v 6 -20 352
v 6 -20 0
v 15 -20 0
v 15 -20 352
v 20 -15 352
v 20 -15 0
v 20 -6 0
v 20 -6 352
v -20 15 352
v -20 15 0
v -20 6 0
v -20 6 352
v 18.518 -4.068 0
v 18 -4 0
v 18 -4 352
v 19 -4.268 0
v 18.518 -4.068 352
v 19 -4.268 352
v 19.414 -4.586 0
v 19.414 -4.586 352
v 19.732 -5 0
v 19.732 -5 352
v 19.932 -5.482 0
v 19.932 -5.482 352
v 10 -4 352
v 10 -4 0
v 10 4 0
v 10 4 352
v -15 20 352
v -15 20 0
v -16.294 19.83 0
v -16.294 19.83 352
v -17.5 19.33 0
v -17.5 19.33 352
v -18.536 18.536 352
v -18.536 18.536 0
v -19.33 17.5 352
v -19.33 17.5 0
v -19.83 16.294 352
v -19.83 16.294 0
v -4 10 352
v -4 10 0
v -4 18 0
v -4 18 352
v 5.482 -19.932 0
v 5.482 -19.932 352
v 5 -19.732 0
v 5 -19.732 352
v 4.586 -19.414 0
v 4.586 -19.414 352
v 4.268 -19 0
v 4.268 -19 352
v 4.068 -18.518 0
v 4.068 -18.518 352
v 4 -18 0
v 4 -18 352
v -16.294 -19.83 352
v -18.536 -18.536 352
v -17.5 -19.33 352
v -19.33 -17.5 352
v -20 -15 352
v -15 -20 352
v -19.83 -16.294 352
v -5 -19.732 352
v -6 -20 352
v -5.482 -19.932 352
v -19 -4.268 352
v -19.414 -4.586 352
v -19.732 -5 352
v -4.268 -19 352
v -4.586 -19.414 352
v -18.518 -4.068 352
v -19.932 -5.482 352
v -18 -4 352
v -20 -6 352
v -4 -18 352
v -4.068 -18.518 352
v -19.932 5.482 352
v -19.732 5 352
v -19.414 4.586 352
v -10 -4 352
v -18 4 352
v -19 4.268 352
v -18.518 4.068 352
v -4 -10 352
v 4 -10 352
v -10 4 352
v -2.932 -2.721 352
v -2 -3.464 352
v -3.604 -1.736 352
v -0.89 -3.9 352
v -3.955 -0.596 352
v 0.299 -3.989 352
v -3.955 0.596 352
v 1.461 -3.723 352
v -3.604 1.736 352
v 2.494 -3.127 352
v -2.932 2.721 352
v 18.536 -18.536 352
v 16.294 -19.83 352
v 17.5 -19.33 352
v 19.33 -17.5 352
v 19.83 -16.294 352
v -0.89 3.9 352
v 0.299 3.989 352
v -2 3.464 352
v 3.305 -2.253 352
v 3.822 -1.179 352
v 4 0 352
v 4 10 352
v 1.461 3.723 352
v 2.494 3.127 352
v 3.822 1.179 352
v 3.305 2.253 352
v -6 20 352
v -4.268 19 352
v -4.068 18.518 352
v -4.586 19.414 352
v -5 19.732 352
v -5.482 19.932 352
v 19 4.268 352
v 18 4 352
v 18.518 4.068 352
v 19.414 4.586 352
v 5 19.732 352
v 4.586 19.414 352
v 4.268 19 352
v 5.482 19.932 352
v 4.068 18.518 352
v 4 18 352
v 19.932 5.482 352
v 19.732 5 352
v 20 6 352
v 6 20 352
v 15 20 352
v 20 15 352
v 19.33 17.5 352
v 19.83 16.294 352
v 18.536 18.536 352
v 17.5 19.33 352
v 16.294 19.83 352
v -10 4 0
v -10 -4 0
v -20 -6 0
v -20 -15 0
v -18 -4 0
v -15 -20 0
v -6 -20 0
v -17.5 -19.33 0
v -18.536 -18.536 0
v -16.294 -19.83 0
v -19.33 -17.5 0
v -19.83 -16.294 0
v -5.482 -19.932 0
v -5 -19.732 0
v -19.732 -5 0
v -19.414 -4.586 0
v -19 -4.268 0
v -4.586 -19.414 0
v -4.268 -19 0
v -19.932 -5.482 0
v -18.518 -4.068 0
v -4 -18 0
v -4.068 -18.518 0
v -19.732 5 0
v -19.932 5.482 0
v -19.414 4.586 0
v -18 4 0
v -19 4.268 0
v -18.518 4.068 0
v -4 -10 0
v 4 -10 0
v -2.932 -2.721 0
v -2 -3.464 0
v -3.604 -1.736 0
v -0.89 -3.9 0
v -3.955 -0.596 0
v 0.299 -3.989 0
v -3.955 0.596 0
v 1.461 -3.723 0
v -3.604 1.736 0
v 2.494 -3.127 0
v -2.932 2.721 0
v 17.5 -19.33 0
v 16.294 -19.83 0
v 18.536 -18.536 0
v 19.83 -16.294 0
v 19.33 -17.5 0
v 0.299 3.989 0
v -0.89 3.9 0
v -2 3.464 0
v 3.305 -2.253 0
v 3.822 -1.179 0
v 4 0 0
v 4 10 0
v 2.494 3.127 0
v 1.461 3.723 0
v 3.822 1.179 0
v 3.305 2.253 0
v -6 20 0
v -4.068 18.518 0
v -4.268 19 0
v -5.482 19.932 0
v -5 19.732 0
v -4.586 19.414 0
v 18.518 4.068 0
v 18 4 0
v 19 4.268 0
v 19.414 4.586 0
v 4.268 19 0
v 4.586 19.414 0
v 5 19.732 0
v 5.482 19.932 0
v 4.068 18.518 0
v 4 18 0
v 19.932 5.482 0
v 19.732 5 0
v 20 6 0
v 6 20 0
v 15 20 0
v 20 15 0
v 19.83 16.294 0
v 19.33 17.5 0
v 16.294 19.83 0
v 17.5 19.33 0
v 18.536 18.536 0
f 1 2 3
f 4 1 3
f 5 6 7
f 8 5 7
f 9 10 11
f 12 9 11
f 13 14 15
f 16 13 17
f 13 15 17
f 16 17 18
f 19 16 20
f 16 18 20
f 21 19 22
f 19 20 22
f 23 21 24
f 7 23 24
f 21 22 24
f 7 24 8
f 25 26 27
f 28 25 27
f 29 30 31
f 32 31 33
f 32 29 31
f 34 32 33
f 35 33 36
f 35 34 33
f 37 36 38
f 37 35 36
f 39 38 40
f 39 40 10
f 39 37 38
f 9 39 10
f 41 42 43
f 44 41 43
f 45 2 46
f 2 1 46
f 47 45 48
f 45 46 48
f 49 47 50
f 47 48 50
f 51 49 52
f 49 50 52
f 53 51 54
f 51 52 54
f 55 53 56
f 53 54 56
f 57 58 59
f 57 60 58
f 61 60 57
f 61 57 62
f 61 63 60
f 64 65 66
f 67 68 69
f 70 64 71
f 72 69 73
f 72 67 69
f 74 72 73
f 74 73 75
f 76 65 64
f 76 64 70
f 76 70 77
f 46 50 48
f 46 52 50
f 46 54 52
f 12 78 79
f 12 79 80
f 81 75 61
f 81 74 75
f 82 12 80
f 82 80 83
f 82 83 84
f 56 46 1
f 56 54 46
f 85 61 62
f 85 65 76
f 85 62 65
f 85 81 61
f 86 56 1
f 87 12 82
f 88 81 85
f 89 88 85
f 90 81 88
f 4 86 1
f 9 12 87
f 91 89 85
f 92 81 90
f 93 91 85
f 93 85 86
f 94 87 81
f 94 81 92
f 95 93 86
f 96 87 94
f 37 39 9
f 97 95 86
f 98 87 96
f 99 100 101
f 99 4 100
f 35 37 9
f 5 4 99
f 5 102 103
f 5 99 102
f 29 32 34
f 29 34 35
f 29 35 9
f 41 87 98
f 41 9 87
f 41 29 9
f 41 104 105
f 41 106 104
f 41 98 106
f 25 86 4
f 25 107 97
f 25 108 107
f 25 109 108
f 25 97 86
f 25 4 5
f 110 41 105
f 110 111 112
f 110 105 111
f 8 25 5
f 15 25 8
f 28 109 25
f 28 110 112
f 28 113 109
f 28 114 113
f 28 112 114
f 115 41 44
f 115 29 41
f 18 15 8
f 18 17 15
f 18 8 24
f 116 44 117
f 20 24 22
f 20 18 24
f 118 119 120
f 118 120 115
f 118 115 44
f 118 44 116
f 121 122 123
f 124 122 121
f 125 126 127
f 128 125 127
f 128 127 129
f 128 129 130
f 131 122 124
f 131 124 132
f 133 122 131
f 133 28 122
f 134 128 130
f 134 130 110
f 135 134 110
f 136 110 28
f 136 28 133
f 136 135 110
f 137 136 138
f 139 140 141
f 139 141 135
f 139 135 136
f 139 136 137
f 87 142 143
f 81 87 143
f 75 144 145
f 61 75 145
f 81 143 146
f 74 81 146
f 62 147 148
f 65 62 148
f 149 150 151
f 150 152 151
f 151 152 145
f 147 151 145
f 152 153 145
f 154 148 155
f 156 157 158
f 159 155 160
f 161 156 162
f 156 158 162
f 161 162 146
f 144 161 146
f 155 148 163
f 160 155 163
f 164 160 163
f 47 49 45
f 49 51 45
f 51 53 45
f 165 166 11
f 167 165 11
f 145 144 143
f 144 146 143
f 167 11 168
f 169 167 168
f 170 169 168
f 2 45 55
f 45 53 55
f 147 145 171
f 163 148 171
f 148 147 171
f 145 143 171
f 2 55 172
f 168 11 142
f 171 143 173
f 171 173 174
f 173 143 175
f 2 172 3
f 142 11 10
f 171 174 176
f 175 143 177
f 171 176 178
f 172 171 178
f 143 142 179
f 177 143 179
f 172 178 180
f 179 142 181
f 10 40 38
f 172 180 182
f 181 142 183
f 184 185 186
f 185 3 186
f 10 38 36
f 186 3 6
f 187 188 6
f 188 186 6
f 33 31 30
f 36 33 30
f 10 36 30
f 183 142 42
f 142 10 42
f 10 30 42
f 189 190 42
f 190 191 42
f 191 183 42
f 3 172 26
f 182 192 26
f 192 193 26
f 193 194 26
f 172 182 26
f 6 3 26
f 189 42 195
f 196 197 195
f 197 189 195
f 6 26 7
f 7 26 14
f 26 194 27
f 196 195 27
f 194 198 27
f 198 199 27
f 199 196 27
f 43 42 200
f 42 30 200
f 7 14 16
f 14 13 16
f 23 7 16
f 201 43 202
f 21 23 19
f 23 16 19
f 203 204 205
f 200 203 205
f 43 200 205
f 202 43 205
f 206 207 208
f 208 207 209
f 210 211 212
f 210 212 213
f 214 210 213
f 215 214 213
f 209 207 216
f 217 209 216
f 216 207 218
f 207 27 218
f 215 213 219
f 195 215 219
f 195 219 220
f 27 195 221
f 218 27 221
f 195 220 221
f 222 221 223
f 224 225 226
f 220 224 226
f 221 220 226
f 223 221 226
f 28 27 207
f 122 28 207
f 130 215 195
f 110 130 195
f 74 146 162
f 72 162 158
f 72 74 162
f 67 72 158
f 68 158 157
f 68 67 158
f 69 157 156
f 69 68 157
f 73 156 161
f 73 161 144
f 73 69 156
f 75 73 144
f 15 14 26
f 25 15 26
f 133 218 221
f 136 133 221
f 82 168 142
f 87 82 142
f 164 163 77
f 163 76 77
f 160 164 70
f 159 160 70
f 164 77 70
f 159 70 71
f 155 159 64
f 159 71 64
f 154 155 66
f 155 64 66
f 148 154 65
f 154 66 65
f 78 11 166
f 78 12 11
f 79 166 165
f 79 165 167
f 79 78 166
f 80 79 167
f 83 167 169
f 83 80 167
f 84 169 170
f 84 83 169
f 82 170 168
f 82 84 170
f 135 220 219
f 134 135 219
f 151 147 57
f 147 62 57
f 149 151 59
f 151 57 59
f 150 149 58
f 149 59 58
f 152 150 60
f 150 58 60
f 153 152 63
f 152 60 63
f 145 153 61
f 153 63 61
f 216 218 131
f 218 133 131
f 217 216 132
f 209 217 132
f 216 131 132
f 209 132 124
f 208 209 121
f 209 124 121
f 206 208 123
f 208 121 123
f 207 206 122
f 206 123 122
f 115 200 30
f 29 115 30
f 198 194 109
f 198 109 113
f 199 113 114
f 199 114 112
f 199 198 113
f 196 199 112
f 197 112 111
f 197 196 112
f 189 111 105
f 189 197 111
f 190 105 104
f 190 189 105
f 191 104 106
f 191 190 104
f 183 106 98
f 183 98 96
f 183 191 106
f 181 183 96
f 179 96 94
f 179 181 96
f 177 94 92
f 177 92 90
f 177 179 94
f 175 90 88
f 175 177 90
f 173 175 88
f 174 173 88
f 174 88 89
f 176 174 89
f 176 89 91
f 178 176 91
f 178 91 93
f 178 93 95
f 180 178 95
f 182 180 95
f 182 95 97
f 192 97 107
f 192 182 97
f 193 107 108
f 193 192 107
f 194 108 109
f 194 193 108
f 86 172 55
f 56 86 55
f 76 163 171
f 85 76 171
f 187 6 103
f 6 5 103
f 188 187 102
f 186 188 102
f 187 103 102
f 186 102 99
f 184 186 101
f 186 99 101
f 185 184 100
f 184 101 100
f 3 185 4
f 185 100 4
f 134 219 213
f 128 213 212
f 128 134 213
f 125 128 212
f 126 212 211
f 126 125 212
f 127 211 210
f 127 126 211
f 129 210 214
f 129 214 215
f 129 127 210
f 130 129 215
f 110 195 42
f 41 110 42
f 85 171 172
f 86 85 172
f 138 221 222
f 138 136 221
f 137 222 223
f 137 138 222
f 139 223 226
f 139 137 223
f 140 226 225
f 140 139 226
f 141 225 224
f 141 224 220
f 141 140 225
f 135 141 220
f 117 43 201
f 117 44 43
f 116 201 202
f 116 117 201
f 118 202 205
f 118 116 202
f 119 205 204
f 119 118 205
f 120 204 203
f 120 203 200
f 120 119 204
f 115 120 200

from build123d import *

# Parameters (mm, degrees)
F0_R     = 4
F1_DEPTH = 352
F2_R     = 5
F3_R     = 2


with BuildPart() as f1:
    # F0 (on Top) → F1 (new body)
    with BuildSketch(Plane.XY):
        Polygon((20, 4), (20, 20), (4, 20), (4, 10), (-4, 10), (-4, 20), (-20, 20), (-20, 4), (-10, 4), (-10, -4), (-20, -4), (-20, -20), (-4, -20), (-4, -10), (4, -10), (4, -20), (20, -20), (20, -4), (10, -4), (10, 4), align=None)
        Circle(F0_R, mode=Mode.SUBTRACT)
    extrude(amount=F1_DEPTH)

    # F2
    f2_edges = [f1.edges().sort_by_distance(p)[0] for p in [
        (-20, 20, 176),
        (-20, -20, 176),
        (20, 20, 176),
        (20, -20, 176),
    ]]
    fillet(f2_edges, radius=F2_R)

    # F3
    f3_edges = [f1.edges().sort_by_distance(p)[0] for p in [
        (-4, 20, 176),
        (4, 20, 176),
        (20, 4, 176),
        (20, -4, 176),
        (4, -20, 176),
        (-4, -20, 176),
        (-20, -4, 176),
        (-20, 4, 176),
    ]]
    fillet(f3_edges, radius=F3_R)


solid = f1.part
